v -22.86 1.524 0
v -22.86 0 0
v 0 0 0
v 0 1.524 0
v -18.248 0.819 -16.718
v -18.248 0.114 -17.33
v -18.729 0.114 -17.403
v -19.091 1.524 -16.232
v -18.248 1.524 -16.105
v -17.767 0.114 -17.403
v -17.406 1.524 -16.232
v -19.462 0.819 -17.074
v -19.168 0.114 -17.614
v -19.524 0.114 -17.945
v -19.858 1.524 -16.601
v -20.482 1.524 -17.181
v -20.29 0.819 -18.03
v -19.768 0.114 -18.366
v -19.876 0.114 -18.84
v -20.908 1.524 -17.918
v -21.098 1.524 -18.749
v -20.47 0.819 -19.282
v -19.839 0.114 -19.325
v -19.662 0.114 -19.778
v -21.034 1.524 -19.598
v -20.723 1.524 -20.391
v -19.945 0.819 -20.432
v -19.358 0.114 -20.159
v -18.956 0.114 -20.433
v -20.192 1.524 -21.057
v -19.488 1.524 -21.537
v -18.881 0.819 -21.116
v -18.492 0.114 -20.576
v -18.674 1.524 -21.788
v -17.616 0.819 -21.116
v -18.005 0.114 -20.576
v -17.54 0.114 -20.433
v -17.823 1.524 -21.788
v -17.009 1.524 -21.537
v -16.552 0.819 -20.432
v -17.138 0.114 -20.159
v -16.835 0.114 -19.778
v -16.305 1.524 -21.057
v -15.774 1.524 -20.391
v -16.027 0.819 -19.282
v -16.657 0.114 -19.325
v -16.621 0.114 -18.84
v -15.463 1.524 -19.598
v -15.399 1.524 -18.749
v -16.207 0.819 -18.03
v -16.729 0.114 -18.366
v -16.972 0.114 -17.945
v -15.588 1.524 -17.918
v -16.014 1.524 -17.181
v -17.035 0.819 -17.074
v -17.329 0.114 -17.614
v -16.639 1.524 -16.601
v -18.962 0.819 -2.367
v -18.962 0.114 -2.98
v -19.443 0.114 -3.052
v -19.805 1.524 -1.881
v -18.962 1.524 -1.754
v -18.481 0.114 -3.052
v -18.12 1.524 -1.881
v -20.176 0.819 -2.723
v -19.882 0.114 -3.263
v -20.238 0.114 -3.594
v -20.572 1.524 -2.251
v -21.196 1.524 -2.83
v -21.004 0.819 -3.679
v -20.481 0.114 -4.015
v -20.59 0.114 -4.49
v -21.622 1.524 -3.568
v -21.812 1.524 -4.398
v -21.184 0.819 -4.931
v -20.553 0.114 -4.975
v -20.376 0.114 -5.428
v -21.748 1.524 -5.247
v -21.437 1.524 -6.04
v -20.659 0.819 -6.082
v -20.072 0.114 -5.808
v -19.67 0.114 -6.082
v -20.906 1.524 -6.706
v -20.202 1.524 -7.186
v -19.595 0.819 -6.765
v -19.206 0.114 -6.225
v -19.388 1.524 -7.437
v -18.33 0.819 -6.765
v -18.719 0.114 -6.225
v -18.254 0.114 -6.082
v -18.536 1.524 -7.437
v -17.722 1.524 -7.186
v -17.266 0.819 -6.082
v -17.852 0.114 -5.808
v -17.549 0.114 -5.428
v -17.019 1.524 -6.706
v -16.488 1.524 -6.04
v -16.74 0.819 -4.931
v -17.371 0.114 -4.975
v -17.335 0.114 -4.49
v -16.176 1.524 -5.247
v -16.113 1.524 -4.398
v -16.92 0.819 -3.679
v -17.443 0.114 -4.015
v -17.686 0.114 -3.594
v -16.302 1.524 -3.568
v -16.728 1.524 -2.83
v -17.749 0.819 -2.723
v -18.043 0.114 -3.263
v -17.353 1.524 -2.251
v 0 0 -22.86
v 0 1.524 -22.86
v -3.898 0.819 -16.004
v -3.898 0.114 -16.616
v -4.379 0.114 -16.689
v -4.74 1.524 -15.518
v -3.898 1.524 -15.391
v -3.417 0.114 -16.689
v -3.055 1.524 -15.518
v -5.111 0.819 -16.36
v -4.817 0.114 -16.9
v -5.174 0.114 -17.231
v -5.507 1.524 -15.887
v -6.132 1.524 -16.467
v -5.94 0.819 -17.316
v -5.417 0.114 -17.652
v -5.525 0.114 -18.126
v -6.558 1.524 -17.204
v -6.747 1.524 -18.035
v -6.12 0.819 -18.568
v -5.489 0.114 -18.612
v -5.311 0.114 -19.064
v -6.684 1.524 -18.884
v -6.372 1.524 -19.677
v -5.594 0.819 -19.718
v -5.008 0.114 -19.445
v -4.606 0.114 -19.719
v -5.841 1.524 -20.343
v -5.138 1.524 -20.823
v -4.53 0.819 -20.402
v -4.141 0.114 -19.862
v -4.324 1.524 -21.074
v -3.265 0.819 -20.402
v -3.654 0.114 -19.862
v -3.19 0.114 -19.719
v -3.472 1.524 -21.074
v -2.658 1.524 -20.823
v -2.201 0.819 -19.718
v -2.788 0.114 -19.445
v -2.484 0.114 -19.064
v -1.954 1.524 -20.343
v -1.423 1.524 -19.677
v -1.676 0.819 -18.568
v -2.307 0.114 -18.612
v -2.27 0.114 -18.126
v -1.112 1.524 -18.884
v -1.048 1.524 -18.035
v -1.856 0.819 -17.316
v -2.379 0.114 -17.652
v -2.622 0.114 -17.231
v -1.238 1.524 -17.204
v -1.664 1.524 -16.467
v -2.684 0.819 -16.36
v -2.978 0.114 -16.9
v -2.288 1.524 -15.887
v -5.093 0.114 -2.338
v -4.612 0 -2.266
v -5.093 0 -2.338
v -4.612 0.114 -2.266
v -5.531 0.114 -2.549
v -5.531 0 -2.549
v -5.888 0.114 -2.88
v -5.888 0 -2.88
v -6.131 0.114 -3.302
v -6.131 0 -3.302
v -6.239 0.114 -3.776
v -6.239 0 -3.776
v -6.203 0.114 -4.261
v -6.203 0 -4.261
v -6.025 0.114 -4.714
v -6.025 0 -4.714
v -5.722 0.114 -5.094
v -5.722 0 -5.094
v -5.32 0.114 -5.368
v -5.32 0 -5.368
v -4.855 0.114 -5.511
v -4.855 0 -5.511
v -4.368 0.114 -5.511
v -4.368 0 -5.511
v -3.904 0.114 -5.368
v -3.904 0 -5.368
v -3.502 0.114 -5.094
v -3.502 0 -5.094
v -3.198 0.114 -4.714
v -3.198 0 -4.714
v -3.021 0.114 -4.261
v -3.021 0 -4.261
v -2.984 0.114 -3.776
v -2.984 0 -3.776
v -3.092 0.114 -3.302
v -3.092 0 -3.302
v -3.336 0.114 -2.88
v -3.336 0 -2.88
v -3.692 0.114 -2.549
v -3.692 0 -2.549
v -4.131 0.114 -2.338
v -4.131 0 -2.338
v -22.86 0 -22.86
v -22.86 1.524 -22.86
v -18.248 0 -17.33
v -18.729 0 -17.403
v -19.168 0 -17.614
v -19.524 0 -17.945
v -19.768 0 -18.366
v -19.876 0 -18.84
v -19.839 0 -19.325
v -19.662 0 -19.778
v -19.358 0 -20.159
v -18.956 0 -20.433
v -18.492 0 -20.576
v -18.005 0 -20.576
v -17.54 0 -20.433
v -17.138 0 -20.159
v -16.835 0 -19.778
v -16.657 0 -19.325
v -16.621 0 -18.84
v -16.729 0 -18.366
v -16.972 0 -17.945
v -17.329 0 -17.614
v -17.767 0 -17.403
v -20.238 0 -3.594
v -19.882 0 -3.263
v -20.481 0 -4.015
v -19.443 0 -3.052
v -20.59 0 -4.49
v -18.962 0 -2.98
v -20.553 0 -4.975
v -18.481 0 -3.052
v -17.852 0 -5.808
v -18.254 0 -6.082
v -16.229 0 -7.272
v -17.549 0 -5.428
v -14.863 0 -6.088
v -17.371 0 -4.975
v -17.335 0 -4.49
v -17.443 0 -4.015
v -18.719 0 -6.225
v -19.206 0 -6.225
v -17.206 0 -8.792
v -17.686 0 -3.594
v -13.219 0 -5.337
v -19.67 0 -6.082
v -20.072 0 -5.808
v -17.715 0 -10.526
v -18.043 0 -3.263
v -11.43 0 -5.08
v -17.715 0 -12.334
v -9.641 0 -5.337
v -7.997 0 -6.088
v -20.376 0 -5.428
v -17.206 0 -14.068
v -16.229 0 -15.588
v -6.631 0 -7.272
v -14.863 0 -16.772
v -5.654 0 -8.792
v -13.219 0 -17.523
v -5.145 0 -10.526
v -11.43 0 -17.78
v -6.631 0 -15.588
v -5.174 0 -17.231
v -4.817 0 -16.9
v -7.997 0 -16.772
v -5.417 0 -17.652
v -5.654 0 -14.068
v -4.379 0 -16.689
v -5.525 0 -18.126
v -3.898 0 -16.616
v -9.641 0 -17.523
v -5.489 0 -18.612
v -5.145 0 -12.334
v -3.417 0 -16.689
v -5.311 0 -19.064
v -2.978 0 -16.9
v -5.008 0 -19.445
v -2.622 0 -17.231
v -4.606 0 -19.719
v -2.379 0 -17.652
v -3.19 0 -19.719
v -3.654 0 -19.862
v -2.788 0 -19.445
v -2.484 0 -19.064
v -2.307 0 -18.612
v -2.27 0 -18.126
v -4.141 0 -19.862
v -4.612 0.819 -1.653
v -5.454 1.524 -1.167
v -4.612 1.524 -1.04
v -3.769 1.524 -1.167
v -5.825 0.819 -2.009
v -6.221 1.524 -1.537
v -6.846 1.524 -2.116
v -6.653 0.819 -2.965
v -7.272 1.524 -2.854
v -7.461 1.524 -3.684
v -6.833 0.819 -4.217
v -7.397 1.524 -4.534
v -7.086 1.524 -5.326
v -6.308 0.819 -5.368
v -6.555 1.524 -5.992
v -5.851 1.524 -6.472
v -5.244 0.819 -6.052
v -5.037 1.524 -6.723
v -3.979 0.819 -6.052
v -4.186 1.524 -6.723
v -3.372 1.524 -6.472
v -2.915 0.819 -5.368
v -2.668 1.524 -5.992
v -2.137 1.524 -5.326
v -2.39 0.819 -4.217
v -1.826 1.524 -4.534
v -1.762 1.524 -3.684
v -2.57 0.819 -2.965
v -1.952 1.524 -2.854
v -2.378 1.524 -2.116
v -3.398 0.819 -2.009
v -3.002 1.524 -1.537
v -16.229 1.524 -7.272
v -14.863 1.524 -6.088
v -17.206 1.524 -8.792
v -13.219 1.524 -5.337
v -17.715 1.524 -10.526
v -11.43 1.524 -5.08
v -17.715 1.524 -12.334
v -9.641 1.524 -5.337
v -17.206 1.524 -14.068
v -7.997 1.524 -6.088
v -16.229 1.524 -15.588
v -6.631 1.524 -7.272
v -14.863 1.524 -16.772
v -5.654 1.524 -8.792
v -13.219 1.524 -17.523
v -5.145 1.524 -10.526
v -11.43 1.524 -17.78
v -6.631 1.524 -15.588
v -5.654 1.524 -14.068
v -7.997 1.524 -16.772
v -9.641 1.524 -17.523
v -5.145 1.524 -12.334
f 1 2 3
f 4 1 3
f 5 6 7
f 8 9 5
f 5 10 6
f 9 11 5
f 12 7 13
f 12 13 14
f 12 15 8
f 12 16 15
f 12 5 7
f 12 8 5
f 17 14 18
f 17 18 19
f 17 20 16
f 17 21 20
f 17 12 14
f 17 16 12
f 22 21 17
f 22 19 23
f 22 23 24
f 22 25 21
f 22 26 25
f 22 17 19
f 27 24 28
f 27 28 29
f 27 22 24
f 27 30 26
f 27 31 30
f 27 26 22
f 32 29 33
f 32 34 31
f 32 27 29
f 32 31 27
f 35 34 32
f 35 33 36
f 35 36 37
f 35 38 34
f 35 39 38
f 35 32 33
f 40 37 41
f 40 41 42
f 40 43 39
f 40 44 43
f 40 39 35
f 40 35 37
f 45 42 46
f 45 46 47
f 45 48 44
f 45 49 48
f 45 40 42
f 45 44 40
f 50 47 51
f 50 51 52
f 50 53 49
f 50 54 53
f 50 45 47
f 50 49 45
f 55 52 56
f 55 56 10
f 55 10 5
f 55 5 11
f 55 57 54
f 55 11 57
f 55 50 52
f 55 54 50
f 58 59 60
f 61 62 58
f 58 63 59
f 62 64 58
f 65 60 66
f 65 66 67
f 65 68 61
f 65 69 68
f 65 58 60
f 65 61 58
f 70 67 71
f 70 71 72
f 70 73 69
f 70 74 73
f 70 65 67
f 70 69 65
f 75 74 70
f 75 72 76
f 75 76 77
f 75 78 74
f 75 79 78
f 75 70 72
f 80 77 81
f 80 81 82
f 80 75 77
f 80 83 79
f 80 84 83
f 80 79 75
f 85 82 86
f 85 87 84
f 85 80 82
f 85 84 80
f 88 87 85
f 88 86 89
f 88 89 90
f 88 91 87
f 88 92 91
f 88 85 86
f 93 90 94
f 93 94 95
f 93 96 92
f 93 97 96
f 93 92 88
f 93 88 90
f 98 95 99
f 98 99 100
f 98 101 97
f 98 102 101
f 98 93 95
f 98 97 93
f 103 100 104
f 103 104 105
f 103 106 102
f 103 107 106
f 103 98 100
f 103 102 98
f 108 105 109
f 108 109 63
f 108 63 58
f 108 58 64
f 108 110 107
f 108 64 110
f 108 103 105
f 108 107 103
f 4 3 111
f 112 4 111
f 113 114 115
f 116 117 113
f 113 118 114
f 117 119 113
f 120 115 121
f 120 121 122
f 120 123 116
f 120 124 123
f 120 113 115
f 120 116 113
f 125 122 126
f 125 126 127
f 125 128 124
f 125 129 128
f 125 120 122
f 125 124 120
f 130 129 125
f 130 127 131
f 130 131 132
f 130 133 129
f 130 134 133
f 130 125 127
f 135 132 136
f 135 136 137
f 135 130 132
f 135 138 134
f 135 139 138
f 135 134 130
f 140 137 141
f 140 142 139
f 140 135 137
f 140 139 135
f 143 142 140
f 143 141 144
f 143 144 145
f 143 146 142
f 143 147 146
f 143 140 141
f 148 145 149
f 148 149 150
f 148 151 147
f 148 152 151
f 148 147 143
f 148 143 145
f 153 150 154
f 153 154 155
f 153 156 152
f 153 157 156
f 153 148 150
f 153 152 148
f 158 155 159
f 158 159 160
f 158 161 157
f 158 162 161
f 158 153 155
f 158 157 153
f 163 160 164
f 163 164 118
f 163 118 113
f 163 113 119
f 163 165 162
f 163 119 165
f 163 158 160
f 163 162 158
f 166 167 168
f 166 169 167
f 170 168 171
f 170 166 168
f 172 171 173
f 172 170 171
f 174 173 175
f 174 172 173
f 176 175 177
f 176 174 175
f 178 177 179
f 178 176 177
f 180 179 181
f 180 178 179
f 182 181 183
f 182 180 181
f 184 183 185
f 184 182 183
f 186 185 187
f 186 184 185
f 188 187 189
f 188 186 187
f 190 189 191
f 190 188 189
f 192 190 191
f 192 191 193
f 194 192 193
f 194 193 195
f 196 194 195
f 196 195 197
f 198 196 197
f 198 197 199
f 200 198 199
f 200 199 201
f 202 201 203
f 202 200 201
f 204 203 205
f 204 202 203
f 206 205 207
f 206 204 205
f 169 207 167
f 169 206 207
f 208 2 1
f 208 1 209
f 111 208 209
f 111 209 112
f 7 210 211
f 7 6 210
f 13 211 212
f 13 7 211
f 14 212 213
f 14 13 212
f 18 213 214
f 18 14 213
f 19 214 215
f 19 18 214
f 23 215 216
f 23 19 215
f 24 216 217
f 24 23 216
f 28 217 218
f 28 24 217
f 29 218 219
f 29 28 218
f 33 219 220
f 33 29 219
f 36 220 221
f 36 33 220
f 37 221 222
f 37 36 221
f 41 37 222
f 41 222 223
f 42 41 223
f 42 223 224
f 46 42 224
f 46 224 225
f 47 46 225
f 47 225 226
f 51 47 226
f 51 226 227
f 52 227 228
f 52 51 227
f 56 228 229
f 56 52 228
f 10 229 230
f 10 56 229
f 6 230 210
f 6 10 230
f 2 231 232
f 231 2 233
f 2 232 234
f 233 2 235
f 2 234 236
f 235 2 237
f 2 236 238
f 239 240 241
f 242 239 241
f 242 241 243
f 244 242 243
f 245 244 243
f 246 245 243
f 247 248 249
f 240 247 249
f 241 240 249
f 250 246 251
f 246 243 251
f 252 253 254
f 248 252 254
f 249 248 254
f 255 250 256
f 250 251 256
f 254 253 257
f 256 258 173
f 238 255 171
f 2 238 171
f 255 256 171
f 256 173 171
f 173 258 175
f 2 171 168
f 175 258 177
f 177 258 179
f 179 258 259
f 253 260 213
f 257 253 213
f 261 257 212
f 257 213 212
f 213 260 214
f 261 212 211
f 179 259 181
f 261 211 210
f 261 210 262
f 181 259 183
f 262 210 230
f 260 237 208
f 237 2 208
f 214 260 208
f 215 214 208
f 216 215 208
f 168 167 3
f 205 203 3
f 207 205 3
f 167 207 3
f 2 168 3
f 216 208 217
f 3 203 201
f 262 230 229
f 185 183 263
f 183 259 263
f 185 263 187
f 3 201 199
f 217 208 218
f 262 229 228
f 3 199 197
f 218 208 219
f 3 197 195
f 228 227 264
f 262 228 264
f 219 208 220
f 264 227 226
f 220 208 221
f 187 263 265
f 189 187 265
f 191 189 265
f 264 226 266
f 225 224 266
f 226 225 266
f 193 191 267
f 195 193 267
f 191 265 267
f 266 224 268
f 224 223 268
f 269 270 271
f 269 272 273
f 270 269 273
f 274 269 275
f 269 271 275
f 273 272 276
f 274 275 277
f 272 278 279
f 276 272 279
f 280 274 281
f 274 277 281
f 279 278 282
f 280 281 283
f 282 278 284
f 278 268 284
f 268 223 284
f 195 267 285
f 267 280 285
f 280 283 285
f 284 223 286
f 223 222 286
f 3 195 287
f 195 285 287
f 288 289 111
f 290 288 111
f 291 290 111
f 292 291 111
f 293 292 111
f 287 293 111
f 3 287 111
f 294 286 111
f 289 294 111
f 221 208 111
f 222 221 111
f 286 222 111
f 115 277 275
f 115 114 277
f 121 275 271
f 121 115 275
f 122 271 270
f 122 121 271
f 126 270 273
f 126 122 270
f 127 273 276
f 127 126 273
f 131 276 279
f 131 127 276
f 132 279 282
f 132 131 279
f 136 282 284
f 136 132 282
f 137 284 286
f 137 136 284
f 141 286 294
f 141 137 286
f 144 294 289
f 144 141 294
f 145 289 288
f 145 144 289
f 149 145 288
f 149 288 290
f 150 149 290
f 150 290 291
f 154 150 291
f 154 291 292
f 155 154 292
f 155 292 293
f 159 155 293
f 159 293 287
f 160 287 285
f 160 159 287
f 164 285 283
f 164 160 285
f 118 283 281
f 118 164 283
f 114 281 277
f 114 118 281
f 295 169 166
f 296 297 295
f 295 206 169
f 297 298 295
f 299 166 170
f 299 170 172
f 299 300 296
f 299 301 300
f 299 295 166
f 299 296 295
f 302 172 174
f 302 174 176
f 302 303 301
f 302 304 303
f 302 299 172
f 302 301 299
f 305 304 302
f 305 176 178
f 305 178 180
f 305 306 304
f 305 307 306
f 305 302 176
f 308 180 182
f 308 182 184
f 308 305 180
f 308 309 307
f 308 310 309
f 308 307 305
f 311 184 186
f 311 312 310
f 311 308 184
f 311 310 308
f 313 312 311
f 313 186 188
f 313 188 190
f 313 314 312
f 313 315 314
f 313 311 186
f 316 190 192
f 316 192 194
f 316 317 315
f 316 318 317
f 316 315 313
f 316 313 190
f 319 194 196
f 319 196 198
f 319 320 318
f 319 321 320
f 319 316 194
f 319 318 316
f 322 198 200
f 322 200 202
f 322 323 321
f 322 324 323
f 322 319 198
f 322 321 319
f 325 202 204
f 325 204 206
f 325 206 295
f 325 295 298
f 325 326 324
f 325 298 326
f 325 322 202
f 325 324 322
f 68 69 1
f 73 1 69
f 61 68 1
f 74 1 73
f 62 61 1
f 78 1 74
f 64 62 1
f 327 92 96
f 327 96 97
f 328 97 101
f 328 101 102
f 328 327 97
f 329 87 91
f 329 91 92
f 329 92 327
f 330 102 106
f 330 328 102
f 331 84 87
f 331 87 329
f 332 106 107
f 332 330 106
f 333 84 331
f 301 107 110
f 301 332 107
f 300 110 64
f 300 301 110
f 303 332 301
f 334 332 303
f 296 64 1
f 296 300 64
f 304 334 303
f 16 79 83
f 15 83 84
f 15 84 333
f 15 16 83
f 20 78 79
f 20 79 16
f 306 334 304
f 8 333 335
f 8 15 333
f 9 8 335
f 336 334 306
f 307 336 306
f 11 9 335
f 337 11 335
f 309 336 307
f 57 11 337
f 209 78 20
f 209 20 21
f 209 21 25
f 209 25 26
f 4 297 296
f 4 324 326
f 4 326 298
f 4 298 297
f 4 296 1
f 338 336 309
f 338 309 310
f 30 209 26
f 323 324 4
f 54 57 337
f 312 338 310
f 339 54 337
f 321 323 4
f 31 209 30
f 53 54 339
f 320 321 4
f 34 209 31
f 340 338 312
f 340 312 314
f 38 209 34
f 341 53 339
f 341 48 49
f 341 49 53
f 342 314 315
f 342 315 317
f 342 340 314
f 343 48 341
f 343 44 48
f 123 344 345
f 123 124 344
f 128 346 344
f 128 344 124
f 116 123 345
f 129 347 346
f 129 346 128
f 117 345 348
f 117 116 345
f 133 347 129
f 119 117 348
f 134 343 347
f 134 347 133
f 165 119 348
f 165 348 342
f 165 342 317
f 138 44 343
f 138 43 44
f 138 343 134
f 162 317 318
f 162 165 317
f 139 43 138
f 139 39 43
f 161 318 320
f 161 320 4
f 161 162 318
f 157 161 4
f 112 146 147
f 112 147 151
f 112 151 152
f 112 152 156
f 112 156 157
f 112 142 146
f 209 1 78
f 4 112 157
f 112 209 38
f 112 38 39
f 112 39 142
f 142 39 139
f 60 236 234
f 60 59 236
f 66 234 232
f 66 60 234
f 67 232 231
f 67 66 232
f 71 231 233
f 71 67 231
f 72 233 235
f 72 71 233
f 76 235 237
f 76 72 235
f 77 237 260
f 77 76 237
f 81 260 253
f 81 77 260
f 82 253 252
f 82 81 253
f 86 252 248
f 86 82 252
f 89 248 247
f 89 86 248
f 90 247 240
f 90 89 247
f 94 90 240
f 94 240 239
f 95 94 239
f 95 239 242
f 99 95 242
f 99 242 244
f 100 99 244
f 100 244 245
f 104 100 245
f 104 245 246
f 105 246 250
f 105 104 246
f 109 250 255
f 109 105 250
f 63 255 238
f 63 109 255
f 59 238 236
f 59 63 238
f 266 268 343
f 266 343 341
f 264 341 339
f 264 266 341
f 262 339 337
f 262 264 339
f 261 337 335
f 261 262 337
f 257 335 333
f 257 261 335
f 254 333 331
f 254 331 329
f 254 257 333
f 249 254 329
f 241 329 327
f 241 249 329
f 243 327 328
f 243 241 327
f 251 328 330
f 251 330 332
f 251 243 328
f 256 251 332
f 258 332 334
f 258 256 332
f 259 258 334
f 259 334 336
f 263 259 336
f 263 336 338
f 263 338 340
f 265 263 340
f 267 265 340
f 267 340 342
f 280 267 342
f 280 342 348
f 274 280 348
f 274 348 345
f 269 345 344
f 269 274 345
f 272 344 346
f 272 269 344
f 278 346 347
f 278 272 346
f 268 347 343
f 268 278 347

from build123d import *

# Parameters (mm, degrees)
SKETCH1_W                                     = 22.86
SKETCH1_H                                     = 22.86
SKETCH1_R                                     = 6.35
BOSS_EXTRUDE1_DEPTH                           = 1.524
CSK_FOR_4_FLAT_HEAD_MACHINE_SCREW1_AT_2_COUNT = 2
CSK_FOR_4_FLAT_HEAD_MACHINE_SCREW1_AT_2_PITCH = 14.368409794
CSK_FOR_4_FLAT_HEAD_MACHINE_SCREW1_AT_3_COUNT = 2
CSK_FOR_4_FLAT_HEAD_MACHINE_SCREW1_AT_3_PITCH = 20.32
CSK_FOR_4_FLAT_HEAD_MACHINE_SCREW1_AT_4_COUNT = 2
CSK_FOR_4_FLAT_HEAD_MACHINE_SCREW1_AT_4_PITCH = 14.368409794


with BuildPart() as part:
    # Sketch1 → Boss-Extrude1 (new body)
    with BuildSketch(Plane(origin=(0, 0, 0), x_dir=(1, 0, 0), z_dir=(0, 1, 0))):
        with Locations((-11.43, 11.43)):
            Rectangle(SKETCH1_W, SKETCH1_H)
        with Locations(Location((-11.43, 11.43, 0), (0, 0, 90))):
            Circle(SKETCH1_R, mode=Mode.SUBTRACT)
    extrude(amount=BOSS_EXTRUDE1_DEPTH)

    # Sketch3 → CSK for #4 Flat Head Machine Screw1 (revolve, cut)
    with BuildSketch(Plane(origin=(-3.897724655, 1.524, -18.248388969), x_dir=(0, 0, 1), z_dir=(1, 0, 0))):
        Polygon((0, 0), (0, 1.524), (1.63195, 1.524), (1.63195, 1.409834001), (2.8575, 0), align=None)
    csk_for_4_flat_head_machine_screw1 = revolve(axis=Axis((-3.897724655, 7.874, -18.248388969), (0, -1, 0)), mode=Mode.SUBTRACT)

    # CSK for #4 Flat Head Machine Screw1 at 2: CSK for #4 Flat Head Machine Screw1 ×2
    with Locations(*[Vector(-0.049684438764001596, 0, 0.99876496561739) * (i * CSK_FOR_4_FLAT_HEAD_MACHINE_SCREW1_AT_2_PITCH) for i in range(1, CSK_FOR_4_FLAT_HEAD_MACHINE_SCREW1_AT_2_COUNT)]):
        add(csk_for_4_flat_head_machine_screw1, mode=Mode.SUBTRACT)

    # CSK for #4 Flat Head Machine Screw1 at 3: CSK for #4 Flat Head Machine Screw1 ×2
    with Locations(*[Vector(-0.7413656835690785, 0, 0.6711012764301324) * (i * CSK_FOR_4_FLAT_HEAD_MACHINE_SCREW1_AT_3_PITCH) for i in range(1, CSK_FOR_4_FLAT_HEAD_MACHINE_SCREW1_AT_3_COUNT)]):
        add(csk_for_4_flat_head_machine_screw1, mode=Mode.SUBTRACT)

    # CSK for #4 Flat Head Machine Screw1 at 4: CSK for #4 Flat Head Machine Screw1 ×2
    with Locations(*[Vector(-0.99876496561739, 0, -0.04968443876400101) * (i * CSK_FOR_4_FLAT_HEAD_MACHINE_SCREW1_AT_4_PITCH) for i in range(1, CSK_FOR_4_FLAT_HEAD_MACHINE_SCREW1_AT_4_COUNT)]):
        add(csk_for_4_flat_head_machine_screw1, mode=Mode.SUBTRACT)


solid = part.part
